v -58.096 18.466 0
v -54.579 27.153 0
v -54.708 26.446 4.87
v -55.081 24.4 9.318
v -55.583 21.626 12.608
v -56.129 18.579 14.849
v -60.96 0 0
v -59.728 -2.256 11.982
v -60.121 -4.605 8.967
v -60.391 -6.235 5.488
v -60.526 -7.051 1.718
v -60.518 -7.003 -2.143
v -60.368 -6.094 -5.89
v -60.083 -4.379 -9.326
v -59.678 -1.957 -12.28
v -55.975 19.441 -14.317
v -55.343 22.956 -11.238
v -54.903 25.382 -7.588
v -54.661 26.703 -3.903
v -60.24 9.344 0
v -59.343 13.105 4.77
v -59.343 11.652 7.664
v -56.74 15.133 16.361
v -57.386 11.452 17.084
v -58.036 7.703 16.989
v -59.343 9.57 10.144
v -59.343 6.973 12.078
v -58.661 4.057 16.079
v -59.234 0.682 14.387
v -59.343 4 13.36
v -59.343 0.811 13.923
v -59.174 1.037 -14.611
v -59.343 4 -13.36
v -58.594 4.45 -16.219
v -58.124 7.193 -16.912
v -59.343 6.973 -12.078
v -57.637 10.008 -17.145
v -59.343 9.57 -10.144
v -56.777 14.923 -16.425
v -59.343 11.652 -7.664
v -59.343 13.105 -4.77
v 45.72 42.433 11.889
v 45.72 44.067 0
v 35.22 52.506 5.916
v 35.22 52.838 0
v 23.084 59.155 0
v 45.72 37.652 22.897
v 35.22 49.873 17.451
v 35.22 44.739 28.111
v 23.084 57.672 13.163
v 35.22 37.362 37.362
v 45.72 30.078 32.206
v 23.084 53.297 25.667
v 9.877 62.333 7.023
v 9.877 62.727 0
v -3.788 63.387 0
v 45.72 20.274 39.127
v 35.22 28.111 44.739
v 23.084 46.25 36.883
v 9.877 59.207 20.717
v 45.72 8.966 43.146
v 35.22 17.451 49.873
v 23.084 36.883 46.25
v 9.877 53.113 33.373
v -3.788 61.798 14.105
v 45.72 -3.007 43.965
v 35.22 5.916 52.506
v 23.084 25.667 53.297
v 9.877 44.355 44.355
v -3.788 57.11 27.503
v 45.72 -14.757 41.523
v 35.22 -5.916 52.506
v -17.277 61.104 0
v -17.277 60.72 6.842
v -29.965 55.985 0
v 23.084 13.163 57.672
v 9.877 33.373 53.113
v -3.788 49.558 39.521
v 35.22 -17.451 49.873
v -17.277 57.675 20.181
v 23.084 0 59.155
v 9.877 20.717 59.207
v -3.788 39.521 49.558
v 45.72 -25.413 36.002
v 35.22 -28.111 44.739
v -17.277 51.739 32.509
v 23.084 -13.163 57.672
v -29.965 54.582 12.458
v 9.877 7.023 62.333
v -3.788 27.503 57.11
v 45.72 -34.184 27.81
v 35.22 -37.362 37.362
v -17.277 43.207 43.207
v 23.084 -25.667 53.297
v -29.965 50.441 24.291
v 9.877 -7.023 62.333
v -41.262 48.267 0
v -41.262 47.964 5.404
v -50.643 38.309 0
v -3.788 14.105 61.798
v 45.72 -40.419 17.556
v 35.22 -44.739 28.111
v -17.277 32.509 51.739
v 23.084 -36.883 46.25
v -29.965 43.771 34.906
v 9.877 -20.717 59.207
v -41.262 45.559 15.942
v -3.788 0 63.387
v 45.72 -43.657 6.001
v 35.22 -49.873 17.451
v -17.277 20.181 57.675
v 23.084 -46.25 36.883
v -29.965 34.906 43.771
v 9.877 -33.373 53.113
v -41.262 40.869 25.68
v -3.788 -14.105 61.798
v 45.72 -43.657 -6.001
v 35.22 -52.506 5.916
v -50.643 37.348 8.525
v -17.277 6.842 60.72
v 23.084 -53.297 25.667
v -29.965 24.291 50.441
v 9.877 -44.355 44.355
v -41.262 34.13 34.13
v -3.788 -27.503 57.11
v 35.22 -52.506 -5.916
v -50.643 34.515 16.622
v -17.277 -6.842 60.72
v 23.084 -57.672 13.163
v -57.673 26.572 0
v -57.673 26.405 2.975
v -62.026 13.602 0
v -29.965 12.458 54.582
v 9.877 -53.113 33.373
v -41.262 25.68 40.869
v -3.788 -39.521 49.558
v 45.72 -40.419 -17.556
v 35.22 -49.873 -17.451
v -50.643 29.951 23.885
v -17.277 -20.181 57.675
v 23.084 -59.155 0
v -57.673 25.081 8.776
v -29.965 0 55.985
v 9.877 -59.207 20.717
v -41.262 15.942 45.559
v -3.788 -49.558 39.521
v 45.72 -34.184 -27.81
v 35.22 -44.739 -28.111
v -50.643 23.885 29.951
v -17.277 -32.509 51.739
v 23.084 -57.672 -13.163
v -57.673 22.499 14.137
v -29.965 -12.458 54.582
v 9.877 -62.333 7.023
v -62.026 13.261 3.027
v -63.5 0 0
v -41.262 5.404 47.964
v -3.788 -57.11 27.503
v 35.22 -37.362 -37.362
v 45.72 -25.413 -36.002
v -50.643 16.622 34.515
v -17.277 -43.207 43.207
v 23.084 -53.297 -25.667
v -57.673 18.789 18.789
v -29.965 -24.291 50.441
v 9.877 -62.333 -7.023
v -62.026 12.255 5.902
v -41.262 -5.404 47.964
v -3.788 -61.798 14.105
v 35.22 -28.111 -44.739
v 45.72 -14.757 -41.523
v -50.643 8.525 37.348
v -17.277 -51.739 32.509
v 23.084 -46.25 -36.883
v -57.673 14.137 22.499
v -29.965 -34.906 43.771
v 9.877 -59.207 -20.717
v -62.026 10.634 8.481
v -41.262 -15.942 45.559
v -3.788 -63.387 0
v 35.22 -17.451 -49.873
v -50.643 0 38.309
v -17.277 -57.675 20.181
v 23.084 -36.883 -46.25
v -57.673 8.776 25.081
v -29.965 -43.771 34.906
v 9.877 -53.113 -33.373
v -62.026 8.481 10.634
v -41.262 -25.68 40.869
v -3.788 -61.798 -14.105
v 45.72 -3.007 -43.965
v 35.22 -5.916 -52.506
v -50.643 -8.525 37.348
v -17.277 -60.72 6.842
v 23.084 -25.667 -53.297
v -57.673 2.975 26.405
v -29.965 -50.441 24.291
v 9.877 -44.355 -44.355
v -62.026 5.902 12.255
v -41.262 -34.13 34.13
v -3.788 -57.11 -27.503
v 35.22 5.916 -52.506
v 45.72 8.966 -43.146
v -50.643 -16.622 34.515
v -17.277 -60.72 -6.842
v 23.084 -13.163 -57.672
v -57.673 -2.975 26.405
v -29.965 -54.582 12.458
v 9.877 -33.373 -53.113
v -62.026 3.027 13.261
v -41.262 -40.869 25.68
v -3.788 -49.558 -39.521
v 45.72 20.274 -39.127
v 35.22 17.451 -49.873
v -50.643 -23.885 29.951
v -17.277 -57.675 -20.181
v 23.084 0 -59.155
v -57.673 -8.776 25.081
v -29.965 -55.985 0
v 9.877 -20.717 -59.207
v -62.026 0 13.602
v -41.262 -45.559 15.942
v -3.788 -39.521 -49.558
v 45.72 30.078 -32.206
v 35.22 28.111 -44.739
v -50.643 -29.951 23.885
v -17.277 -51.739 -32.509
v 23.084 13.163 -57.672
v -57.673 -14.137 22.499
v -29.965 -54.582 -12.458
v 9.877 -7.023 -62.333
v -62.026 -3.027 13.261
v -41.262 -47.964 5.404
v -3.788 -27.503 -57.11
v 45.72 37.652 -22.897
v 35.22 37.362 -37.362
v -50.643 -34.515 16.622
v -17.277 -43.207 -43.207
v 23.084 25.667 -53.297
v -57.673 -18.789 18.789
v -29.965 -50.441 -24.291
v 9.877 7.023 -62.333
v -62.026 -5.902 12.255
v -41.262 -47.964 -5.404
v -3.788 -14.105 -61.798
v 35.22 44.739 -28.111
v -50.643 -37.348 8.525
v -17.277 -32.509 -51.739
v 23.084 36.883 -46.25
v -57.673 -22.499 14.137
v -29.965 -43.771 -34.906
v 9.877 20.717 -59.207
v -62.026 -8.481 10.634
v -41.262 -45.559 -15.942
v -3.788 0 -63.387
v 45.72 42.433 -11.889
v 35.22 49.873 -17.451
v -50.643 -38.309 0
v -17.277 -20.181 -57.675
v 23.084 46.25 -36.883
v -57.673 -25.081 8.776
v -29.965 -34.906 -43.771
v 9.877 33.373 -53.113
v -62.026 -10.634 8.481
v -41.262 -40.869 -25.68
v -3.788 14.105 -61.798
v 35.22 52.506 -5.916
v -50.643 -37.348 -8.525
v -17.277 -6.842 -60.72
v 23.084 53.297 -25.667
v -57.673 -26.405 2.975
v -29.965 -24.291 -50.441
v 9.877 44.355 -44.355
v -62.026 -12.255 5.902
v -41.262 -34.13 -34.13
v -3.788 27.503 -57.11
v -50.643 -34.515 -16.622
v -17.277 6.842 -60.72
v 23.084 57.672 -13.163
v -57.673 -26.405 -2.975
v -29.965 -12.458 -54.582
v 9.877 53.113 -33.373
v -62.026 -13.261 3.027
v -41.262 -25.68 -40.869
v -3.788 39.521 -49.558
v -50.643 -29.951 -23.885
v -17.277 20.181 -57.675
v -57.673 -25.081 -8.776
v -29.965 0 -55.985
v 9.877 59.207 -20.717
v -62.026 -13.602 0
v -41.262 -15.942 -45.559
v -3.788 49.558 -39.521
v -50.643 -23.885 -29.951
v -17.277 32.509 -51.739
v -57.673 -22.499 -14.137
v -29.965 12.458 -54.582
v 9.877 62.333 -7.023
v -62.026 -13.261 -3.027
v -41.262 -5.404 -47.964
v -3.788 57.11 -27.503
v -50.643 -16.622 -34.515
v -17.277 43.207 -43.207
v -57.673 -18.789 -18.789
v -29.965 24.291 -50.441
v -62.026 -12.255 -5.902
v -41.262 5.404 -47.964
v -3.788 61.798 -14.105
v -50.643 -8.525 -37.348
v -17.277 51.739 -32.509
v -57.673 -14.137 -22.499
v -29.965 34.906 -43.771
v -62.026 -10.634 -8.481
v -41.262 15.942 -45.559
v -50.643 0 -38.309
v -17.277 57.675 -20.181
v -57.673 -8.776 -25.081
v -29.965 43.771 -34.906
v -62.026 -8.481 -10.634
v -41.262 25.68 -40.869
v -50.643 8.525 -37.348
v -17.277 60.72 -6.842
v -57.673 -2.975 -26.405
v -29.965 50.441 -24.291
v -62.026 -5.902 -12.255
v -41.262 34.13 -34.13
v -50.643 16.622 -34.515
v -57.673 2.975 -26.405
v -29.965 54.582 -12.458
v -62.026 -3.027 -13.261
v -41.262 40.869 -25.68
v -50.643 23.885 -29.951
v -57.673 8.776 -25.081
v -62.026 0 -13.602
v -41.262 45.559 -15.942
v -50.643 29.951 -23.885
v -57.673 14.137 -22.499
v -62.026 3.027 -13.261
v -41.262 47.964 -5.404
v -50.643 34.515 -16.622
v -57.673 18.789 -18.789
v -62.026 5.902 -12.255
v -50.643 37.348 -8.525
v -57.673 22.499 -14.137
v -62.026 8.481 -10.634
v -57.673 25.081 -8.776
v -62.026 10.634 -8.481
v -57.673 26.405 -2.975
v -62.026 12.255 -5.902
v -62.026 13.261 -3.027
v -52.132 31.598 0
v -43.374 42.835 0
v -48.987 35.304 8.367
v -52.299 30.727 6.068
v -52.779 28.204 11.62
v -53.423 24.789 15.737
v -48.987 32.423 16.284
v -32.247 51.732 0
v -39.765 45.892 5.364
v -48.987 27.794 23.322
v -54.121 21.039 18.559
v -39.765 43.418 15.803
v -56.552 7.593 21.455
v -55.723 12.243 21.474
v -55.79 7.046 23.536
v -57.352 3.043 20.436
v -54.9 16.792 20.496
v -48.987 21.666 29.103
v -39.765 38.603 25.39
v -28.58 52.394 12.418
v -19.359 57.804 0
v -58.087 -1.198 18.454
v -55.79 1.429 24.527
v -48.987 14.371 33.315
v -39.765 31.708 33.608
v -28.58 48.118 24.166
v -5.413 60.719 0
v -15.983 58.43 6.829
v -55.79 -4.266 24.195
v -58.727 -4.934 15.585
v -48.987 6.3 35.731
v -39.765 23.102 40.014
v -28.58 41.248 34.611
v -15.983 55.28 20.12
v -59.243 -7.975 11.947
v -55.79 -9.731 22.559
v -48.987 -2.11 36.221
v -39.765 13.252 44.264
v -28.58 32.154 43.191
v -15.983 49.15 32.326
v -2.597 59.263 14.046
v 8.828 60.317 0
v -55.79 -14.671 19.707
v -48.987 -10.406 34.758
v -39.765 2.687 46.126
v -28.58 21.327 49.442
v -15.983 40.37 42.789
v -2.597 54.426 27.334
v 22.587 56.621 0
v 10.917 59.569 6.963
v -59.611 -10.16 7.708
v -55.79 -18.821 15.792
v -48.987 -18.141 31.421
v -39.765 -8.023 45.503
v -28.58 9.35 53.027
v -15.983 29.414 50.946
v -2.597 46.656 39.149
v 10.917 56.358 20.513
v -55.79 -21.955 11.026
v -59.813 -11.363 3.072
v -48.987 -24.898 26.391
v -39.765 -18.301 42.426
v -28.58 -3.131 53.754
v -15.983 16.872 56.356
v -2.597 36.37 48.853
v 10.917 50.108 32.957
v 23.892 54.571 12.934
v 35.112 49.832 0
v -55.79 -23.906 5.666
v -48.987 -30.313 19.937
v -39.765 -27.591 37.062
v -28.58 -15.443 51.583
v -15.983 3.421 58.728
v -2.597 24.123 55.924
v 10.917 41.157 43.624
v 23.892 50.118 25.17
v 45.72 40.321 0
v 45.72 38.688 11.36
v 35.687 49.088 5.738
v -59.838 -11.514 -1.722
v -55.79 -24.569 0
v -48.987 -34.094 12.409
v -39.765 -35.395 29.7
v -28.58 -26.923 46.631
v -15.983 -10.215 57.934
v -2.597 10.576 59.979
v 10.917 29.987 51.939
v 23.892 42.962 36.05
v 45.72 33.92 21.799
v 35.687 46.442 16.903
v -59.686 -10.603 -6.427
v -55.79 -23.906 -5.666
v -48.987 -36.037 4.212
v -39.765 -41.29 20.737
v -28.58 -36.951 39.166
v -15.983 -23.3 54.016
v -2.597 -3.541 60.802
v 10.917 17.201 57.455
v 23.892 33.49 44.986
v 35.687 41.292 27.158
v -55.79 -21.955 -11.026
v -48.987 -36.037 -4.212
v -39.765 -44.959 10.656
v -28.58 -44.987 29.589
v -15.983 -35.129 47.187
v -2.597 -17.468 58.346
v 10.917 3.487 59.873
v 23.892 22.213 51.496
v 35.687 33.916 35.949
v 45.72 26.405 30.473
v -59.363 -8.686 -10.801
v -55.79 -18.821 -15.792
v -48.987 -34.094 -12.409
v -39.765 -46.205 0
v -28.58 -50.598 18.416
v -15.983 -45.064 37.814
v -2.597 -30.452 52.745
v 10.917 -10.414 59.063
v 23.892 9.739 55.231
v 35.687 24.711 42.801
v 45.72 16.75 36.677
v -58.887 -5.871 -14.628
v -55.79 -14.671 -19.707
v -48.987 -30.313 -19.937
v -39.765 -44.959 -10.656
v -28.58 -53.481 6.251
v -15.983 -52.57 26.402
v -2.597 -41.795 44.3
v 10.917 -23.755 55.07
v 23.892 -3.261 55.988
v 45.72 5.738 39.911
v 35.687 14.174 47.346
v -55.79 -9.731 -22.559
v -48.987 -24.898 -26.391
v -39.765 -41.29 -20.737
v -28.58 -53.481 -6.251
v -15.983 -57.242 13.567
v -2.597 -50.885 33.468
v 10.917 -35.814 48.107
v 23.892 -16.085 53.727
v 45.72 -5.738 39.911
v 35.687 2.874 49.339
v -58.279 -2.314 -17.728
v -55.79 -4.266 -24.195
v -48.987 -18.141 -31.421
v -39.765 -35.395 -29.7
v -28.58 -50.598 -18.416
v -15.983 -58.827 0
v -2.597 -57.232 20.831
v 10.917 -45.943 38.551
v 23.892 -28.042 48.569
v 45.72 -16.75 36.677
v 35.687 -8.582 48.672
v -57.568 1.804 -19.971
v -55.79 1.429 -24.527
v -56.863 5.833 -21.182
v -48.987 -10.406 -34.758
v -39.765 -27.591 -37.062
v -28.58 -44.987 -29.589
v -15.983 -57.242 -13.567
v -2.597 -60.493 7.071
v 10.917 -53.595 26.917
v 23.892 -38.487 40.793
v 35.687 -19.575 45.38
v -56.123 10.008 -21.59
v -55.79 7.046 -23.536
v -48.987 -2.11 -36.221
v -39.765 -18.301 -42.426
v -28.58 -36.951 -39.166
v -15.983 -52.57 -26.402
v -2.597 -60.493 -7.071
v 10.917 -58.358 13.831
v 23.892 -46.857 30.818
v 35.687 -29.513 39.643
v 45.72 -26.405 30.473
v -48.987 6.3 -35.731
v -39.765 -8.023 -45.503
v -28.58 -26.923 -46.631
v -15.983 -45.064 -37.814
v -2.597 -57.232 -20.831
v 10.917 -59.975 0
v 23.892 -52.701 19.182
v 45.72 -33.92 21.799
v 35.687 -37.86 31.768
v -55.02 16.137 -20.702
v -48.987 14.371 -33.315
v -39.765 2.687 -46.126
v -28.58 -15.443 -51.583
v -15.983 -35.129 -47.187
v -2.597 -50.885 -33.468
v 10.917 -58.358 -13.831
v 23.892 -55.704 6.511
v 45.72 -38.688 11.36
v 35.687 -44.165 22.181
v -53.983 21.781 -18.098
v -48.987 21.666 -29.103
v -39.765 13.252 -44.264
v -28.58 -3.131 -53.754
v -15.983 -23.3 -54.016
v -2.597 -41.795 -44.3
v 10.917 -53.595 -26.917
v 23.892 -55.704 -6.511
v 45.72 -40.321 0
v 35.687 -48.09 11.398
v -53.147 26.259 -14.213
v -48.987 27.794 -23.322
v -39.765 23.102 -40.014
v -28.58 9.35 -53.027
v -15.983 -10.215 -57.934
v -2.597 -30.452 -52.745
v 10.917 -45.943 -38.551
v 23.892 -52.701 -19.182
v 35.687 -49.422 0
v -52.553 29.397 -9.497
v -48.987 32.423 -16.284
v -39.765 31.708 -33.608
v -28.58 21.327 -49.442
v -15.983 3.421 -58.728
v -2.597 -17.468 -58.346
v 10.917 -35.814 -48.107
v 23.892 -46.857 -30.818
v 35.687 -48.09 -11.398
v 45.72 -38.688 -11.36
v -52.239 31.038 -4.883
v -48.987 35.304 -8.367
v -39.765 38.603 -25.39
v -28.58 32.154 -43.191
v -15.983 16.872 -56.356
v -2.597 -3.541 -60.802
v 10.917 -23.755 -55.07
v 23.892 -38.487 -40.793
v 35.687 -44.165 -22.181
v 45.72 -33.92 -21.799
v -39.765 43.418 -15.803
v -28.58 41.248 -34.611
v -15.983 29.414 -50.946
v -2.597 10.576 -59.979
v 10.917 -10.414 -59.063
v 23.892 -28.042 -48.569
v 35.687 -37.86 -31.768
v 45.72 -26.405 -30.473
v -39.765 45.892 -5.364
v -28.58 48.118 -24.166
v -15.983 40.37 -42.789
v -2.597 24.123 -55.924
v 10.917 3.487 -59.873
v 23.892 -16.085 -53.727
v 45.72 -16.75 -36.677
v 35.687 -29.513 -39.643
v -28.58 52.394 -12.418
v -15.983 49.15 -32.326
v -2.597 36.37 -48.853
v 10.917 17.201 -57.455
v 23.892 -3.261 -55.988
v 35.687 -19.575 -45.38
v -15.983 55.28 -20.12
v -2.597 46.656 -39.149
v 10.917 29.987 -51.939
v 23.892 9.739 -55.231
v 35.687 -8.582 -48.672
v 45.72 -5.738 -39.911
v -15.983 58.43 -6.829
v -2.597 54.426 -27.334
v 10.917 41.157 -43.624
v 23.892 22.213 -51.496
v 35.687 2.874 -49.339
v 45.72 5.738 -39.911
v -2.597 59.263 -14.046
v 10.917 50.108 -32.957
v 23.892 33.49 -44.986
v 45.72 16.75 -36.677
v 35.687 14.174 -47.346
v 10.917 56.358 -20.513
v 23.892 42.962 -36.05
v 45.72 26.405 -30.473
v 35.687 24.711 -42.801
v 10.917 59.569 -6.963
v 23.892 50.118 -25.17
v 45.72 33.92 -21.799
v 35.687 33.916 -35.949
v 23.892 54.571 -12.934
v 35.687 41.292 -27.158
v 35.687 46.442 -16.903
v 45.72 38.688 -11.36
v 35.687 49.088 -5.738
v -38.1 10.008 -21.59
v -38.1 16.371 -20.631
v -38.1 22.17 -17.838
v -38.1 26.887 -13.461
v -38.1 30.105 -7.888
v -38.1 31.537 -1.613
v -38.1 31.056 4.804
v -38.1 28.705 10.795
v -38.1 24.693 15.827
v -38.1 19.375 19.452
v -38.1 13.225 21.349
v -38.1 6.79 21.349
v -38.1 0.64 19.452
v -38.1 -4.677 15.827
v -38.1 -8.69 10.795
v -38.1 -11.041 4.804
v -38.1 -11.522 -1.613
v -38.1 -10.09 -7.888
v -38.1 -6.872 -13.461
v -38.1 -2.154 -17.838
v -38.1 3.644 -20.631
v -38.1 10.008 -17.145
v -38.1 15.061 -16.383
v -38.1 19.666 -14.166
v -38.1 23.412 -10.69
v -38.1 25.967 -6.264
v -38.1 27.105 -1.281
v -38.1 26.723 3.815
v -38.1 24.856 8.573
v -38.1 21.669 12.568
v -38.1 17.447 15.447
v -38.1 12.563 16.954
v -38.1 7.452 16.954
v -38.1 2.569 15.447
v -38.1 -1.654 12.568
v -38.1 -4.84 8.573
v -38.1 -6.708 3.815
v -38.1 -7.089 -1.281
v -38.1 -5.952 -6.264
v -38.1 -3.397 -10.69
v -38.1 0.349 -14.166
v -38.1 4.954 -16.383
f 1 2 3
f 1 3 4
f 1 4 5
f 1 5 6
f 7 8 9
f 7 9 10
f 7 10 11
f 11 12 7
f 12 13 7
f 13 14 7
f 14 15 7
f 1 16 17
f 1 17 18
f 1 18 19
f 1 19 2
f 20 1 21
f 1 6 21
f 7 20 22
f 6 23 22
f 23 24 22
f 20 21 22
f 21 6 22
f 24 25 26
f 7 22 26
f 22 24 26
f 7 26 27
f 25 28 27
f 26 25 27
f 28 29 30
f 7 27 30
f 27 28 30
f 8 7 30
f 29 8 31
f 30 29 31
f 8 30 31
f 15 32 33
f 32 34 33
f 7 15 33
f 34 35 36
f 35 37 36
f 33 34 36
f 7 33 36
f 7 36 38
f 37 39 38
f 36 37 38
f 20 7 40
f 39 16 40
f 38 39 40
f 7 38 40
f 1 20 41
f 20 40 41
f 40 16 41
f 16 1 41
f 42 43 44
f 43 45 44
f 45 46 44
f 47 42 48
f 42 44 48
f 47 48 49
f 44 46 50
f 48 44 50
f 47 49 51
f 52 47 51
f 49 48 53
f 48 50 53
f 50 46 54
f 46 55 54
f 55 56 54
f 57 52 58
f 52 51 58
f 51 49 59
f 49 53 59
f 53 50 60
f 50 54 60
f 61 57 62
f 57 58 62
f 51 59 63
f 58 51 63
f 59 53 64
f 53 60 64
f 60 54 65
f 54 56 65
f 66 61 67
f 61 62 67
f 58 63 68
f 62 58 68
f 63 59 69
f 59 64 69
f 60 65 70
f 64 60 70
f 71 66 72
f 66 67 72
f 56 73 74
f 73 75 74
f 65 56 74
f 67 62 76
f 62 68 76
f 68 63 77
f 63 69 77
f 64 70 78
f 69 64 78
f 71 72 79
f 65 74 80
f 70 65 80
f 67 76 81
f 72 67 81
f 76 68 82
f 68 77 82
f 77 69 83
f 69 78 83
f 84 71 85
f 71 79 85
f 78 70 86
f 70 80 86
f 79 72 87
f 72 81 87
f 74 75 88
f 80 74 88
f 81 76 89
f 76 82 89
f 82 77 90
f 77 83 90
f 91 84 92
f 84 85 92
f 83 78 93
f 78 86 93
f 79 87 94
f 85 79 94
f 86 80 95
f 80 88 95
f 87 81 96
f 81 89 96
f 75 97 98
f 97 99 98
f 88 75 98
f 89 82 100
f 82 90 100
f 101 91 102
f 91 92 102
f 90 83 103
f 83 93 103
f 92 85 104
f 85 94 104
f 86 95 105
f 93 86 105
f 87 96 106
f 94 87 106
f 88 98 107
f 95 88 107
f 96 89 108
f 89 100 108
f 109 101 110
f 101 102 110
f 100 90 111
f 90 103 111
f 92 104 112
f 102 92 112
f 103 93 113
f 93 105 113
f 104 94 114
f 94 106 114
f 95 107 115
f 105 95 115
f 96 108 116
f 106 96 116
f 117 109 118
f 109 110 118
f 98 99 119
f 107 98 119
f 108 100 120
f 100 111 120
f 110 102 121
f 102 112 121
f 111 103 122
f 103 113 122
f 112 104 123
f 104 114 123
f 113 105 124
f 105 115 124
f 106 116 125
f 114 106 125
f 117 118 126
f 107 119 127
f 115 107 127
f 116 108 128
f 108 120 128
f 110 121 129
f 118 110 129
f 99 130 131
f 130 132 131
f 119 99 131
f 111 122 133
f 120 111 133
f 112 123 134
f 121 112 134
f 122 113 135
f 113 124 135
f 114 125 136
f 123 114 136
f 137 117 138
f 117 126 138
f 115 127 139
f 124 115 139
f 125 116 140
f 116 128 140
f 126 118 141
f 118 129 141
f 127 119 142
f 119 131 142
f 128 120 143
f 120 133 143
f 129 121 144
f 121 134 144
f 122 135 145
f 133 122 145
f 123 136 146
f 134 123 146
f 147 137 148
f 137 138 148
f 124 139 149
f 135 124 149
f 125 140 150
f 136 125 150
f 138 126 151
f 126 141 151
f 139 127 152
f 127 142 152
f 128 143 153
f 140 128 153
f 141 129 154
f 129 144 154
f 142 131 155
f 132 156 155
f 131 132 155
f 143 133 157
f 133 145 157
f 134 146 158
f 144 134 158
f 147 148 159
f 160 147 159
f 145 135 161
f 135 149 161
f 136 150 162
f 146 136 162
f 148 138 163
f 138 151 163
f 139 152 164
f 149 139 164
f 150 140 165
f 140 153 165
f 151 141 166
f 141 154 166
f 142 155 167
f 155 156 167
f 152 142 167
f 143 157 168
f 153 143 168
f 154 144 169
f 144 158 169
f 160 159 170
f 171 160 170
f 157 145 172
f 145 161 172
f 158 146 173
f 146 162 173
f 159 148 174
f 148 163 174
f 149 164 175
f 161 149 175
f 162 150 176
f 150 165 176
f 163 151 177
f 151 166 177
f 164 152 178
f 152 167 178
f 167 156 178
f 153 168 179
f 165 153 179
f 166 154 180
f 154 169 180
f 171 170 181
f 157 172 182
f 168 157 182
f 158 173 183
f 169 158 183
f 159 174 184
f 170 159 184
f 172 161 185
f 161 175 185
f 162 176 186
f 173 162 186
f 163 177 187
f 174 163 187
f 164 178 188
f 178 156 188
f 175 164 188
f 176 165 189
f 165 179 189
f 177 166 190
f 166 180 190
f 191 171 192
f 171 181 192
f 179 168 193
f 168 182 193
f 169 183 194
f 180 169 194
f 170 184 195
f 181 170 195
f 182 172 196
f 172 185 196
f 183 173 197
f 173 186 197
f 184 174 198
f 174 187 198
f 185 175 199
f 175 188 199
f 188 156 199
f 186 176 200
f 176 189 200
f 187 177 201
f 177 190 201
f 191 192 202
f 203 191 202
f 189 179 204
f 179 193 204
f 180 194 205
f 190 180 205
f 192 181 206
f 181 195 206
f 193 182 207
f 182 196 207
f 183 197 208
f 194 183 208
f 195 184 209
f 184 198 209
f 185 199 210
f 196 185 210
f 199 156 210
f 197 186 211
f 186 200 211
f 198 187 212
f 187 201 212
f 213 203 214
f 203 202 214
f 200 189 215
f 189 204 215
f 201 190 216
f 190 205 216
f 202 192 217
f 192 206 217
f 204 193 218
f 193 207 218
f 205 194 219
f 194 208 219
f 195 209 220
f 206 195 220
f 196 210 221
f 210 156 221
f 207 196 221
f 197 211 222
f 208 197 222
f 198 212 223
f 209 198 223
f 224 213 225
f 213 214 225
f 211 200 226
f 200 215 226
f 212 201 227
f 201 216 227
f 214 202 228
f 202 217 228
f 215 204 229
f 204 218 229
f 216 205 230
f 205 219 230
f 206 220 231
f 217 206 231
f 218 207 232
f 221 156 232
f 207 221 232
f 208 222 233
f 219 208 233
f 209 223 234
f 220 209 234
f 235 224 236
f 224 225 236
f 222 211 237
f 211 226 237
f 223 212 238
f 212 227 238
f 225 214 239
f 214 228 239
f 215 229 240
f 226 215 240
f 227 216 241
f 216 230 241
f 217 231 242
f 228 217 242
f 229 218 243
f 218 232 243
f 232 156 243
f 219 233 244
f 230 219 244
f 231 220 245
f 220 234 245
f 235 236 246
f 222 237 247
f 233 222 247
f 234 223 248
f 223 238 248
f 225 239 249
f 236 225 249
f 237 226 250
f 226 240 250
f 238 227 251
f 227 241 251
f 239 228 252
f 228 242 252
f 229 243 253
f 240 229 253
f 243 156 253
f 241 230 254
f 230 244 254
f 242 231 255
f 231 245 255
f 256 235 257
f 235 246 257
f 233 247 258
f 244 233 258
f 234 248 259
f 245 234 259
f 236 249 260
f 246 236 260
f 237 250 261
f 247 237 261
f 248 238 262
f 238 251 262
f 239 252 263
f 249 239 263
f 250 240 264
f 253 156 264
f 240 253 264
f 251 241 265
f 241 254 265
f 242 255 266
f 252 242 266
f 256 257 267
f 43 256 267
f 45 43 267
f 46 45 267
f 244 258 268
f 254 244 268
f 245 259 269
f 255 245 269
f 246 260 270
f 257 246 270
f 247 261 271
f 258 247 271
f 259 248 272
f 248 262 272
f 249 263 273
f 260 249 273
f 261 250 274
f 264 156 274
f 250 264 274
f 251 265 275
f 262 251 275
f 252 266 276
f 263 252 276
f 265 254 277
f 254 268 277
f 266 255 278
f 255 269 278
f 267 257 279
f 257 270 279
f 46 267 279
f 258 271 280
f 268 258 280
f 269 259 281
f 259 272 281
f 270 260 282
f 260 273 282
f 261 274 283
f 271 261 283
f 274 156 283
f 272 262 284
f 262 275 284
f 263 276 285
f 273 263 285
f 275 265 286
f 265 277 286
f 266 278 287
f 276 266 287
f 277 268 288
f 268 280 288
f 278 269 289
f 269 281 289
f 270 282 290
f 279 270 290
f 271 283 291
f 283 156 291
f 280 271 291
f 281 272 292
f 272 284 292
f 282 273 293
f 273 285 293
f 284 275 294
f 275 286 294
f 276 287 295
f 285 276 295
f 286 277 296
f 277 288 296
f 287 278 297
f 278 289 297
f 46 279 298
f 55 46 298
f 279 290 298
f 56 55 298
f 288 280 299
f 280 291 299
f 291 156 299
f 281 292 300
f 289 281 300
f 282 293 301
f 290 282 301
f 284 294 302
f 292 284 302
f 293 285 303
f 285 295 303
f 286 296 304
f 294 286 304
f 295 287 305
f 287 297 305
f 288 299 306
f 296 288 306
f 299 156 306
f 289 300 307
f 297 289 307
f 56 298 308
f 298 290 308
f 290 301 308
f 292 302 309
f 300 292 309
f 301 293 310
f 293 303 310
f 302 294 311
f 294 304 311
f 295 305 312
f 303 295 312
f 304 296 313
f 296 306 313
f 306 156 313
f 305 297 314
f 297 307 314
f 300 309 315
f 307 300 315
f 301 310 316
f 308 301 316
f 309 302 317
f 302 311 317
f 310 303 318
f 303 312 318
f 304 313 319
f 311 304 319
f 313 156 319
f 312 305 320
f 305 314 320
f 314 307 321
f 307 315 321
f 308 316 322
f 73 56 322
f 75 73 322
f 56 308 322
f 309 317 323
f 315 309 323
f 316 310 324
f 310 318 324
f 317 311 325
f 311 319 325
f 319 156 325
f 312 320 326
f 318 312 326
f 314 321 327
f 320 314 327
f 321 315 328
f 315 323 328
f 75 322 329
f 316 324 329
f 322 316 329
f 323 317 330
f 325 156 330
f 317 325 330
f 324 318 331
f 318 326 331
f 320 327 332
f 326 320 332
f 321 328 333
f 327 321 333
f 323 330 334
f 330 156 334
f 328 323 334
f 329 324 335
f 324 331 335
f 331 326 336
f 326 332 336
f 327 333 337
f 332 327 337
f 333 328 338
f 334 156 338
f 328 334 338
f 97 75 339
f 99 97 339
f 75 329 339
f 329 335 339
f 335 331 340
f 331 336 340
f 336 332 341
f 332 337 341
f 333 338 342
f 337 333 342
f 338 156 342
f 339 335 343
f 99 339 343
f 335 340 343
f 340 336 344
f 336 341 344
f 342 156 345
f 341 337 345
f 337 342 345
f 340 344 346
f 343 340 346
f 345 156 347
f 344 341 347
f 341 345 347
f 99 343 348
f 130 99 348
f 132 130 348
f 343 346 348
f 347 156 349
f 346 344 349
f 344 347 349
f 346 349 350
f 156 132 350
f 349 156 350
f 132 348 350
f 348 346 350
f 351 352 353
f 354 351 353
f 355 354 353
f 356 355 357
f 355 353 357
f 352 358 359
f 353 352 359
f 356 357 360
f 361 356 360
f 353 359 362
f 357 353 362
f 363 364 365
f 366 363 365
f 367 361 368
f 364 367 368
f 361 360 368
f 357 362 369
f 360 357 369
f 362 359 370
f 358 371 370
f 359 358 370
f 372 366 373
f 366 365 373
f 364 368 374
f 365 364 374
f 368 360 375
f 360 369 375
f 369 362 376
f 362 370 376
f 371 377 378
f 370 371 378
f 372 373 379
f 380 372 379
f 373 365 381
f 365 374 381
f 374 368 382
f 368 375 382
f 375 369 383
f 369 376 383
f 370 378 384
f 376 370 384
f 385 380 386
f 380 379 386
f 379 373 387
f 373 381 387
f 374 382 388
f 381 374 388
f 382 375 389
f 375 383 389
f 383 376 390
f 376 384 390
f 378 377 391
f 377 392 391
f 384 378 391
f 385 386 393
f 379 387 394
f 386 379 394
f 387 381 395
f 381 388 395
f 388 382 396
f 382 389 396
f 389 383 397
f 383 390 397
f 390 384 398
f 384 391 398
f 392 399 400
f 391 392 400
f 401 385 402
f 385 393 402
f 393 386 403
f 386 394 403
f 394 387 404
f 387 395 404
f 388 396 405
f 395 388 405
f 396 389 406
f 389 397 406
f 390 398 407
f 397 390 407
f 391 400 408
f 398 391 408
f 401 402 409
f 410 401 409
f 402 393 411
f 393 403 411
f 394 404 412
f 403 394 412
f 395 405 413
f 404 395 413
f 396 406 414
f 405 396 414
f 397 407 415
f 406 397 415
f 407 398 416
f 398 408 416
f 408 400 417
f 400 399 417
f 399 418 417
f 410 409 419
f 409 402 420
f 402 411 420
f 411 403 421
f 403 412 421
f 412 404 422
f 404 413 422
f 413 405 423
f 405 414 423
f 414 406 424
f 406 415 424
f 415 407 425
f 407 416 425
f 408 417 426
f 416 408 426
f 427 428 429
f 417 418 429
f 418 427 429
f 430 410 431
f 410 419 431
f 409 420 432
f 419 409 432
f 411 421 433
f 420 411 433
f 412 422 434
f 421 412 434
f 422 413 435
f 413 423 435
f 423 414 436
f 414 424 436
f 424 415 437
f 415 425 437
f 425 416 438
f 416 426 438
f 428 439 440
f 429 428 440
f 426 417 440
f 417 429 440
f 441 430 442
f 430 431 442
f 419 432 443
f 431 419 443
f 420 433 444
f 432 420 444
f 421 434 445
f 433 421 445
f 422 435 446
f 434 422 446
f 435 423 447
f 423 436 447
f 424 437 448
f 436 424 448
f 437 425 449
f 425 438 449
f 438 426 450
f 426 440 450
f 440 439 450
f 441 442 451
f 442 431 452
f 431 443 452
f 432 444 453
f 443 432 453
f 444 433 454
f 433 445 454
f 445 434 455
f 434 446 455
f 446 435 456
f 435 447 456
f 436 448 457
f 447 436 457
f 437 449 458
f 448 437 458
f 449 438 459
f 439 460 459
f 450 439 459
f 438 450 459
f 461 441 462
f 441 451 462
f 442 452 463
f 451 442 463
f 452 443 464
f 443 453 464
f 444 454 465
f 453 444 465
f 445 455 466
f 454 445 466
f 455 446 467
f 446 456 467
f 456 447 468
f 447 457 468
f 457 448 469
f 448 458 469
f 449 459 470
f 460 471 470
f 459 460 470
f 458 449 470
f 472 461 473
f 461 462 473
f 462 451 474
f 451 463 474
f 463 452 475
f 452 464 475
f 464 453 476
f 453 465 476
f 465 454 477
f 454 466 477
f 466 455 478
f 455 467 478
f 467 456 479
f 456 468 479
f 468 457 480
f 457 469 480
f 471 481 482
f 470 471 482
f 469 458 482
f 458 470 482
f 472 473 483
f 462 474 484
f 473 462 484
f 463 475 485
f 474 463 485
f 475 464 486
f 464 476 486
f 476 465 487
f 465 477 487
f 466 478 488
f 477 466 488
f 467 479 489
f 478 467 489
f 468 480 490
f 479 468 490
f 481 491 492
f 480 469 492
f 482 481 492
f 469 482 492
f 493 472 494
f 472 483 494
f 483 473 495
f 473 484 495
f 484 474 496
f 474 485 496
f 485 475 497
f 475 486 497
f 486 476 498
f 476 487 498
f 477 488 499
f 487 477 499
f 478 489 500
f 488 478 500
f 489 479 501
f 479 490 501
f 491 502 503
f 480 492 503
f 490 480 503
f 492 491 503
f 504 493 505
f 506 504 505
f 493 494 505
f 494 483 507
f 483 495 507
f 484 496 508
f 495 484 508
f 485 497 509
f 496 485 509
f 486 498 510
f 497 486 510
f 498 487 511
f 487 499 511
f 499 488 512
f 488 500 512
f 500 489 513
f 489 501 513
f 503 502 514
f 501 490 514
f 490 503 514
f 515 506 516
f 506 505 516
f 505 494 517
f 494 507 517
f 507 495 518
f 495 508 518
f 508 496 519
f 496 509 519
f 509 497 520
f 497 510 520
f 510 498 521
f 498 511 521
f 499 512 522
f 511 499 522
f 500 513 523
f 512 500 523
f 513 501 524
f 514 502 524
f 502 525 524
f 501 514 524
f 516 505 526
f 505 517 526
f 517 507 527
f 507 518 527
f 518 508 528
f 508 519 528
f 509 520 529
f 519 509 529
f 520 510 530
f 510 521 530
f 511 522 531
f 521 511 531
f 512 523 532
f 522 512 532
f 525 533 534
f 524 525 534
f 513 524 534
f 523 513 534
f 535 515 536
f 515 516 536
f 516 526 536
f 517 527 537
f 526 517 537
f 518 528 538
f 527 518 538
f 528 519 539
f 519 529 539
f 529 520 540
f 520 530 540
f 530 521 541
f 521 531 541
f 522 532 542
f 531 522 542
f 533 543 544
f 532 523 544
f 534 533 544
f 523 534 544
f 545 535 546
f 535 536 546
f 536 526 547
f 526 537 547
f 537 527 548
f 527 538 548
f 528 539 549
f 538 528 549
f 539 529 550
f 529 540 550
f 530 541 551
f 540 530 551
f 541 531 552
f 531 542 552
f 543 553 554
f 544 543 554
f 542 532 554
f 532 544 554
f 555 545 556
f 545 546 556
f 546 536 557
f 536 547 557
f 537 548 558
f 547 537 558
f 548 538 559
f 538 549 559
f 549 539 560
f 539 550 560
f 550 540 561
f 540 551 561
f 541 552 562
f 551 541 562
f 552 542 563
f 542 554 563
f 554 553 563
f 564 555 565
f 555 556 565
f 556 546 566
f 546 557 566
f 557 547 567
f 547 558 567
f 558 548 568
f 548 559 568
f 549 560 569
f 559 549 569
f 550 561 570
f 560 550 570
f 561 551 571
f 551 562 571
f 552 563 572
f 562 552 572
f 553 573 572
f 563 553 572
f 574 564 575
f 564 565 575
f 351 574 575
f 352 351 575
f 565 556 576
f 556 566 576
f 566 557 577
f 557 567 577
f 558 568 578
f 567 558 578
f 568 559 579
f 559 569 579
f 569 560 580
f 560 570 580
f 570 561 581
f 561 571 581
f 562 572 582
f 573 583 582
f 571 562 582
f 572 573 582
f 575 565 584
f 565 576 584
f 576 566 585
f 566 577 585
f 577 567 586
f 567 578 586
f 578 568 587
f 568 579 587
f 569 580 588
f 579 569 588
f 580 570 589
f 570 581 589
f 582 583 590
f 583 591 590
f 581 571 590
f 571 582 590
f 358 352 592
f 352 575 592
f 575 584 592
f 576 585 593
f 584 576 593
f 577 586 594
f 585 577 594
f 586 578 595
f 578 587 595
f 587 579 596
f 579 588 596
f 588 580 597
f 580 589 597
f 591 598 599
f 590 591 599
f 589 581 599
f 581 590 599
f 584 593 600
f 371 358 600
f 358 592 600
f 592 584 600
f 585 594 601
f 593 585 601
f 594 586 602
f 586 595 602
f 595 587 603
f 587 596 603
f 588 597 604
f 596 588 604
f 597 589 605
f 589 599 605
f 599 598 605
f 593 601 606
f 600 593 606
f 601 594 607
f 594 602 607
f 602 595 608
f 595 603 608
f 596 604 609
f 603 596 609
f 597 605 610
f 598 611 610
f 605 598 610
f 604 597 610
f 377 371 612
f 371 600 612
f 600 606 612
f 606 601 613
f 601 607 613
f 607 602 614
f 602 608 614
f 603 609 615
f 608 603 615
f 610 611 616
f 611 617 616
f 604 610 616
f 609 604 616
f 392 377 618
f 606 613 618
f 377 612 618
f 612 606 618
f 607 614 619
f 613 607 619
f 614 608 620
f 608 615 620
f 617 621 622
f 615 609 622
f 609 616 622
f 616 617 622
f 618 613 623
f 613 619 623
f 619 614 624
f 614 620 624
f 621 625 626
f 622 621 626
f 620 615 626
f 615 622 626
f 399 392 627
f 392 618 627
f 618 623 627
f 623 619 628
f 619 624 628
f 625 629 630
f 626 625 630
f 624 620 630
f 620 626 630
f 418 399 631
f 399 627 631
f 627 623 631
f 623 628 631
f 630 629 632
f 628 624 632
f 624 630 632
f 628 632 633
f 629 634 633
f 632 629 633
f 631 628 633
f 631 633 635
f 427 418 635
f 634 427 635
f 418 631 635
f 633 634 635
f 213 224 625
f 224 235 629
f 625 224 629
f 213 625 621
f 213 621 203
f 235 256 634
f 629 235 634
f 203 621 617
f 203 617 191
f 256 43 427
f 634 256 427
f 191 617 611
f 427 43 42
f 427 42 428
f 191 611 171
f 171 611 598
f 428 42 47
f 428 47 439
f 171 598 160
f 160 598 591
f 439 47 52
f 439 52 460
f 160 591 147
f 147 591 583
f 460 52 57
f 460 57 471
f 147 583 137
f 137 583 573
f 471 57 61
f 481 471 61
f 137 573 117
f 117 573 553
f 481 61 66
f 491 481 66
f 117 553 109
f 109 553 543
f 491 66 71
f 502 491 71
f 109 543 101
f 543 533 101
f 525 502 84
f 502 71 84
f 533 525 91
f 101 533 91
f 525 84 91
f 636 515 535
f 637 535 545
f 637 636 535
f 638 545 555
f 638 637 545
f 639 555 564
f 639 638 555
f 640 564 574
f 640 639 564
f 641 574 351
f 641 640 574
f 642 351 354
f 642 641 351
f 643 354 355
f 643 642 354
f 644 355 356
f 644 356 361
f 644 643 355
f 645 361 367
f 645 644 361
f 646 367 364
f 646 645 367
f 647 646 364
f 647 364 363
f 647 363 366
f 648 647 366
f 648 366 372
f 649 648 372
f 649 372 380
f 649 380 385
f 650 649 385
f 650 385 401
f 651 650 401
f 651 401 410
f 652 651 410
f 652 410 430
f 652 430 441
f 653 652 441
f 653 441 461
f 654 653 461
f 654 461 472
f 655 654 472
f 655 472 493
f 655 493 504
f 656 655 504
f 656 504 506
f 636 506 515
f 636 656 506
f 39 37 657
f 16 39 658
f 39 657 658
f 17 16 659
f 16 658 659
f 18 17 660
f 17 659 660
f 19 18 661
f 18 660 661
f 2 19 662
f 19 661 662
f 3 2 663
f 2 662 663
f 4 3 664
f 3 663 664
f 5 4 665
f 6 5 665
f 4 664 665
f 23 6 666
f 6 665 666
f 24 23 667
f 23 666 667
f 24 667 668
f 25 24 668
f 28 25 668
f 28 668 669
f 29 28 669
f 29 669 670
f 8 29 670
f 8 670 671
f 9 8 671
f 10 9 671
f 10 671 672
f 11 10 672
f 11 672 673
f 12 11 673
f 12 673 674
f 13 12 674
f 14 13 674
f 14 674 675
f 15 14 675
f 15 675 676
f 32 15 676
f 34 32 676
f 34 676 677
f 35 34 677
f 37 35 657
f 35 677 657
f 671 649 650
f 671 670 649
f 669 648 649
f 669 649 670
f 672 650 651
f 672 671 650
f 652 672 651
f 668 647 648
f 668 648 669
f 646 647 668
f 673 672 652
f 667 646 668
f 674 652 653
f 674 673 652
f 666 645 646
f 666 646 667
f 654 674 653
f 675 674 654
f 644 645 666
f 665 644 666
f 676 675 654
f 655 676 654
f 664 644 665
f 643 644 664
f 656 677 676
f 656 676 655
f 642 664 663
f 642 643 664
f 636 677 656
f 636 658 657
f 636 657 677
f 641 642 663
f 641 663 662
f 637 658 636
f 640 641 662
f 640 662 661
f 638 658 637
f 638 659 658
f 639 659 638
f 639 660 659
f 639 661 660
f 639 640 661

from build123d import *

# Parameters (mm, degrees)
BOSS_EXTRUDE1_REACH      = 150.085
BOSS_EXTRUDE1_END_RADIUS = 60.96
BOSS_EXTRUDE1_START      = -38.1
SKETCH2_R                = 21.59
SKETCH2_R_2              = 17.145


with BuildPart() as part:
    # Sketch1 → Revolve1 (revolve)
    with BuildSketch(Plane.XY):
        with BuildLine():
            Line((-63.5, 0), (-60.96, 0))
            ThreePointArc((-60.96, 0), (-21.552614691, 57.022858574), (45.72, 40.321249981))
            Line((45.72, 40.321249981), (45.72, 44.067352995))
            ThreePointArc((45.72, 44.067352995), (-23.759524406, 58.887477446), (-63.5, 0))
        make_face()
    revolve(axis=Axis((-63.5, 0, 0), (1, 0, 0)))

    # Boss-Extrude1: up to this sphere (the profile starts inside it)
    boss_extrude1_end = Location((0, 0, 0)) * Sphere(BOSS_EXTRUDE1_END_RADIUS, mode=Mode.PRIVATE)
    # Sketch2 → Boss-Extrude1 (add, up to the surface)
    with BuildSketch(Plane(origin=(0, 0, 0), x_dir=(0, 0, -1), z_dir=(1, 0, 0)).offset(BOSS_EXTRUDE1_START), mode=Mode.PRIVATE) as boss_extrude1_sk1:
        with Locations((0, 10.0076)):
            Circle(SKETCH2_R)
        with Locations((0, 10.0076)):
            Circle(SKETCH2_R_2, mode=Mode.SUBTRACT)
    boss_extrude1_tool1 = extrude(boss_extrude1_sk1.sketch, amount=-BOSS_EXTRUDE1_REACH, mode=Mode.PRIVATE) & boss_extrude1_end
    add(boss_extrude1_tool1.solids().sort_by_distance((-38.1, 10.0076, 20.979343))[0])


solid = part.part
